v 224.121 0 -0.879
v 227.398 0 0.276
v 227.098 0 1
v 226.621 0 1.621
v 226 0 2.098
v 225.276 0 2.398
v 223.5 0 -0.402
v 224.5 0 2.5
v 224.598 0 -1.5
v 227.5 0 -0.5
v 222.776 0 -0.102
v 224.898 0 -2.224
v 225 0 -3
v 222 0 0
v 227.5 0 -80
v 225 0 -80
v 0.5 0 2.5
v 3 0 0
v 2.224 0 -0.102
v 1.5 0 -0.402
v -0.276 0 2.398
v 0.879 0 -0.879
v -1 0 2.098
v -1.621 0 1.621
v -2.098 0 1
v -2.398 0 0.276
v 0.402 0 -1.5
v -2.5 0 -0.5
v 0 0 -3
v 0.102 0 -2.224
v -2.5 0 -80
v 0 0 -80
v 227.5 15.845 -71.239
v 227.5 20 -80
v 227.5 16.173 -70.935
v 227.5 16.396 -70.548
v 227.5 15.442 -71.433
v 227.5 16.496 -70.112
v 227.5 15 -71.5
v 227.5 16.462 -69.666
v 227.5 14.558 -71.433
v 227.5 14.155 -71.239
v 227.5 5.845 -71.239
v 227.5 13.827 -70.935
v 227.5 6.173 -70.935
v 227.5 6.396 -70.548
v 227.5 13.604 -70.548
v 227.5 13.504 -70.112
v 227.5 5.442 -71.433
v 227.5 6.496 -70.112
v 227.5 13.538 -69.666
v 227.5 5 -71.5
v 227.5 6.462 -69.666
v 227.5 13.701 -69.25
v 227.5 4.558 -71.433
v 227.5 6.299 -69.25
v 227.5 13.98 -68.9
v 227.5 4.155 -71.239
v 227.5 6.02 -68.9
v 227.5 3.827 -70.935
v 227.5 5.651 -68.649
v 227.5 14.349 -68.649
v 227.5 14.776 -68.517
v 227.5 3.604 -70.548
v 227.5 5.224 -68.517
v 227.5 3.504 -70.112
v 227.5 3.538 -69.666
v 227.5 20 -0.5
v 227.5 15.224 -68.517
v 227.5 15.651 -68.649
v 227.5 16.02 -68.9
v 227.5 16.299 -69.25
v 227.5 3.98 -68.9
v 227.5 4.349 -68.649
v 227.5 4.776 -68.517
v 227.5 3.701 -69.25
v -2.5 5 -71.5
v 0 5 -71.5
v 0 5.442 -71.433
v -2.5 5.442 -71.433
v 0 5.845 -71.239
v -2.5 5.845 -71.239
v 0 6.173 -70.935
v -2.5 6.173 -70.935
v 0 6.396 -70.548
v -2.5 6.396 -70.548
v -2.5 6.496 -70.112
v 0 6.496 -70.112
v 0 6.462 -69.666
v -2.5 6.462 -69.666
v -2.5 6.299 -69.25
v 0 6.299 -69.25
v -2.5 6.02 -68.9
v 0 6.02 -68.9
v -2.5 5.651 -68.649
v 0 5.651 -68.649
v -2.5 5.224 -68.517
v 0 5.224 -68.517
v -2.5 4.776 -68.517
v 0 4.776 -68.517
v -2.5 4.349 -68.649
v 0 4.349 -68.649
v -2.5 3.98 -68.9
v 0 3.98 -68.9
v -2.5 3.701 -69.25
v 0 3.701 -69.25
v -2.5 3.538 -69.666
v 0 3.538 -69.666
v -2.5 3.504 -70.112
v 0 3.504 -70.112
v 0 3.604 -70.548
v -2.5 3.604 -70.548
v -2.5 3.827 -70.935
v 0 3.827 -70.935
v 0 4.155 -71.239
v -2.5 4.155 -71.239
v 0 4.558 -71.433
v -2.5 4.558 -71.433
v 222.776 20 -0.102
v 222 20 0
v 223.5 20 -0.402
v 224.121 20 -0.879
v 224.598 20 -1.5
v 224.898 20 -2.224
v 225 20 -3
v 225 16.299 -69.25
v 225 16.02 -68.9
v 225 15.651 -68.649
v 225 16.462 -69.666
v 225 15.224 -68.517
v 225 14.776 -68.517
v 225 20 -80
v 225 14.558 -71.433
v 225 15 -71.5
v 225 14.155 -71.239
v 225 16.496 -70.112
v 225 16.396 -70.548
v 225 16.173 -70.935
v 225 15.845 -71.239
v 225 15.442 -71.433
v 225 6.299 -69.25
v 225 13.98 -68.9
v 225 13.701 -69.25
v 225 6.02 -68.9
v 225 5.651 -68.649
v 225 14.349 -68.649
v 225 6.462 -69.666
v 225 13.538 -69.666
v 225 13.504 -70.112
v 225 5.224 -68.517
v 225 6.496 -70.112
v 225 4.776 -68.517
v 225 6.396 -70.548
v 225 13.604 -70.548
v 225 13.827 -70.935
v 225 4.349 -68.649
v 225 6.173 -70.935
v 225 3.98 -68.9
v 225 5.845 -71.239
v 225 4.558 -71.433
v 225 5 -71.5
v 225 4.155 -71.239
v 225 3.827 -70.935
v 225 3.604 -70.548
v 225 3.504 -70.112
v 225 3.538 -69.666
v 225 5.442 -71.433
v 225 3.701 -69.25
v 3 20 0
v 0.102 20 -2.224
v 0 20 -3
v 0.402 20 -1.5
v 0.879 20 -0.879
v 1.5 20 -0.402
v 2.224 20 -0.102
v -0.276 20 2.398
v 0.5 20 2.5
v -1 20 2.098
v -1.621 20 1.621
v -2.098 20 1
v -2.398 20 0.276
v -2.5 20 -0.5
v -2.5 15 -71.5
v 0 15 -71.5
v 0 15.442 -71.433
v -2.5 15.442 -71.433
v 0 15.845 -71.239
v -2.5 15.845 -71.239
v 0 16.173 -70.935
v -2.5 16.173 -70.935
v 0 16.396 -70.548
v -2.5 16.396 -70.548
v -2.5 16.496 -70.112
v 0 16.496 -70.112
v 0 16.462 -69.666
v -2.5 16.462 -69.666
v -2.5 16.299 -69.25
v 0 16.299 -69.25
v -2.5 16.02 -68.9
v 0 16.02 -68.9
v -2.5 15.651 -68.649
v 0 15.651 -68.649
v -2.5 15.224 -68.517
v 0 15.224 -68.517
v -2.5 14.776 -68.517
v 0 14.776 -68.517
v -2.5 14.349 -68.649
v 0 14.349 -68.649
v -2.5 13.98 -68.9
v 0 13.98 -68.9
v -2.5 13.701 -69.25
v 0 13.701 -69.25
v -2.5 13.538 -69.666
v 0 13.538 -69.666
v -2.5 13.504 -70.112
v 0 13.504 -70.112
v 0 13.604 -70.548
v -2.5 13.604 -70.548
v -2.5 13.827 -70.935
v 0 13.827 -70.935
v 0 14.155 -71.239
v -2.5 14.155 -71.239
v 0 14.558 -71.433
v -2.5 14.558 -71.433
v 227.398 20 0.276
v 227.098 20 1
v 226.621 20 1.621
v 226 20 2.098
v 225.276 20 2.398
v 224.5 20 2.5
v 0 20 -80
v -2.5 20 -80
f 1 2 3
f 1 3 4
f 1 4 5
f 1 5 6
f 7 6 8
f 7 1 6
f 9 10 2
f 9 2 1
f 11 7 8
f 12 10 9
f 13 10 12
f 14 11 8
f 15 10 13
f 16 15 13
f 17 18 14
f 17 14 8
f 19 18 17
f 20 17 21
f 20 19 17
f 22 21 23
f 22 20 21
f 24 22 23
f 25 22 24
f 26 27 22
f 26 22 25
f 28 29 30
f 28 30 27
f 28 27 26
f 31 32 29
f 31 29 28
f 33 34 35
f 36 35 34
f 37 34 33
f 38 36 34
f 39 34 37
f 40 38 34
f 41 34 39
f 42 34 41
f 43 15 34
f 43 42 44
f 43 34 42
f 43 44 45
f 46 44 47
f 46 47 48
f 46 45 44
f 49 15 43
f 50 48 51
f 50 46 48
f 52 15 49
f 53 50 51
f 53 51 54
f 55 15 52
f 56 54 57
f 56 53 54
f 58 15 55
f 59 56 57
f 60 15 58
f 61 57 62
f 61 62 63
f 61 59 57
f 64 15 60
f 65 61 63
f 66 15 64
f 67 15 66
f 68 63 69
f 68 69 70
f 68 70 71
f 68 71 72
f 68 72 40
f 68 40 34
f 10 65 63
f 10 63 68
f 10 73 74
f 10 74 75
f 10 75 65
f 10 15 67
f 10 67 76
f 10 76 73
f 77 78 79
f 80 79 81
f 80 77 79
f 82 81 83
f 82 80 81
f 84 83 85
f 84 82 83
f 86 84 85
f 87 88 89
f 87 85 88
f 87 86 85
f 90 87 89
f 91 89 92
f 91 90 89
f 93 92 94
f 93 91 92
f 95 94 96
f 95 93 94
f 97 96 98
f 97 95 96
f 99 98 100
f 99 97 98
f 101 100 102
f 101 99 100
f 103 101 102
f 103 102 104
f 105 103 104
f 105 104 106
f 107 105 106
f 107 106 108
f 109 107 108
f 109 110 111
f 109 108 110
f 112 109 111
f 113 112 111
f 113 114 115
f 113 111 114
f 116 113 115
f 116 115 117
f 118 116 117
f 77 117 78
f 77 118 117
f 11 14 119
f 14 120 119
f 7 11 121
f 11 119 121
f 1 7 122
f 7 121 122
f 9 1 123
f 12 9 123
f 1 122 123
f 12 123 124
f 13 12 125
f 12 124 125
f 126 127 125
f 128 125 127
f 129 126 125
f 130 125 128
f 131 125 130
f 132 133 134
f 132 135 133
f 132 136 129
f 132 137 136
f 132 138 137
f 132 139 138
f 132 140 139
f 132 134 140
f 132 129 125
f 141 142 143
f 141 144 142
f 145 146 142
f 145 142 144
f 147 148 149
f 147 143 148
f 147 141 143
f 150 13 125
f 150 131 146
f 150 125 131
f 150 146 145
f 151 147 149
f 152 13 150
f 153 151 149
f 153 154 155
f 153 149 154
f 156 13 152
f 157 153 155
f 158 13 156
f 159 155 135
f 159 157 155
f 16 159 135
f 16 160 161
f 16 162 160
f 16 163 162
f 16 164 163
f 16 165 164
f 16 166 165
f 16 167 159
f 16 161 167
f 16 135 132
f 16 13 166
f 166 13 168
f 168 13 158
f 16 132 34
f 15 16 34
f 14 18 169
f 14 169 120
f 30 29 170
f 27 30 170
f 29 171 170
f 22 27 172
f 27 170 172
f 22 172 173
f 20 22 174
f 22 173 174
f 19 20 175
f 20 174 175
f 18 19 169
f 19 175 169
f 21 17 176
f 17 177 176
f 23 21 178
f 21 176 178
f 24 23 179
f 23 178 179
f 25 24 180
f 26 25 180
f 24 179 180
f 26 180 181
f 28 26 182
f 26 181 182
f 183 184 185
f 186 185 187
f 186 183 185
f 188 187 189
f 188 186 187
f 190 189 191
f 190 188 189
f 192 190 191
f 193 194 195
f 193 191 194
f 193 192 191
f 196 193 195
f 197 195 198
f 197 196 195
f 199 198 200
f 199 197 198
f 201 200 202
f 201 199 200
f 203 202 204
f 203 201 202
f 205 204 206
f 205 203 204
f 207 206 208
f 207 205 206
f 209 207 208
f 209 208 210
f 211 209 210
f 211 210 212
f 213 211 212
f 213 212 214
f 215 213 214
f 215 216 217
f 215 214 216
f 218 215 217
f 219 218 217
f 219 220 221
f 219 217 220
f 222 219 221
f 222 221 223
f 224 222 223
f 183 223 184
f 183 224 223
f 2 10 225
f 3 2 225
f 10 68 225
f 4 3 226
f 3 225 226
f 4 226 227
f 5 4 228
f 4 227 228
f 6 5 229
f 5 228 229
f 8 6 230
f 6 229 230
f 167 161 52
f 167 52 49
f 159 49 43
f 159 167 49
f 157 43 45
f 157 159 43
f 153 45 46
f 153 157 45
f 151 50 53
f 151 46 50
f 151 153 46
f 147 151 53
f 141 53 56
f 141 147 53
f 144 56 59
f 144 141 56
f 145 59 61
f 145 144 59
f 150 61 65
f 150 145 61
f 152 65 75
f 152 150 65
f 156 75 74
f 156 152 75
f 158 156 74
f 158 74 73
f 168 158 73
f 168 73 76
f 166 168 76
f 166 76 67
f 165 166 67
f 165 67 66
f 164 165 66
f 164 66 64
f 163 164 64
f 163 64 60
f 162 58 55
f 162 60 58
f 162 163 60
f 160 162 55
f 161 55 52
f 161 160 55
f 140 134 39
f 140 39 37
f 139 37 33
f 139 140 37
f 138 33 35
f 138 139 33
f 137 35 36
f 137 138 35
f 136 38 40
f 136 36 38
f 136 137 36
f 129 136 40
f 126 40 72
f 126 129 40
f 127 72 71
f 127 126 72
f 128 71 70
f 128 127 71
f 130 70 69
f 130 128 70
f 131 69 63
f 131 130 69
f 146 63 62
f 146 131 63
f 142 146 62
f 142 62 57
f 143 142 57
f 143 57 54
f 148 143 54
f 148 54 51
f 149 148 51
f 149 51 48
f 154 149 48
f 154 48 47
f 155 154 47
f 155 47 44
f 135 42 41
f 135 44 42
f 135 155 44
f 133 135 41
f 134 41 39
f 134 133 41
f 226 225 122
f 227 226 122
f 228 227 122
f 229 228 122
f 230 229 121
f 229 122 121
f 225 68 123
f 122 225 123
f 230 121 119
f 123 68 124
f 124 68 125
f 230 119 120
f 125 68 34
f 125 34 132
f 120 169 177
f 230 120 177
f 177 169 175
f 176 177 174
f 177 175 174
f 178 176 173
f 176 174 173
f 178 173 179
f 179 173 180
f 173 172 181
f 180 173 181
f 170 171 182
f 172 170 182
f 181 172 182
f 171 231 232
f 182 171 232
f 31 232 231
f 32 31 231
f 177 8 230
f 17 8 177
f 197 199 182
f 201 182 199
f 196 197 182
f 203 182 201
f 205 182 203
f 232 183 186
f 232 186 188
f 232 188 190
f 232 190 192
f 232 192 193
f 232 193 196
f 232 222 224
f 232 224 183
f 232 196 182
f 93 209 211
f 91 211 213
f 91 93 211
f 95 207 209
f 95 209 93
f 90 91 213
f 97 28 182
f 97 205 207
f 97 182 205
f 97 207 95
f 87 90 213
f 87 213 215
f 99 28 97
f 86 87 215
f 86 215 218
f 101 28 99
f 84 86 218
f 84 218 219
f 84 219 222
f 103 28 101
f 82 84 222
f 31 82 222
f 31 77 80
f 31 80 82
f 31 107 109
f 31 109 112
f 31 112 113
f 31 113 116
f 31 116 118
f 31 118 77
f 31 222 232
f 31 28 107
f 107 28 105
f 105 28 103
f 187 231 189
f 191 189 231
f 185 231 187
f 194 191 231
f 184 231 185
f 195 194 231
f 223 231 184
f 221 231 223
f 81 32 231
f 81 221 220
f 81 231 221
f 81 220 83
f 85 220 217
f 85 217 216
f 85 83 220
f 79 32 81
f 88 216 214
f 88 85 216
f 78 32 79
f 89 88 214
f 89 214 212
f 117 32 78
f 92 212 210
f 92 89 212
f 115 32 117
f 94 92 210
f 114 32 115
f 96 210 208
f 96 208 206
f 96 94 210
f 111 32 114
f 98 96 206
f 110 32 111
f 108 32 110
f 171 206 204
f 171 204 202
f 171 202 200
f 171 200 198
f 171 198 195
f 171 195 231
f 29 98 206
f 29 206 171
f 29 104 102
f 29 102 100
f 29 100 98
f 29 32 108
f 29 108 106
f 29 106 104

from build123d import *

# Parameters (mm, degrees)
EXTRUDE_THIN1_DEPTH = 20
FILLET1_R           = 3
SKETCH2_R           = 1.5
CUT_EXTRUDE1_DEPTH  = 270


with BuildPart() as part:
    # Sketch1 → Extrude-Thin1 (new body)
    with BuildSketch(Plane(origin=(0, 0, 0), x_dir=(1, 0, 0), z_dir=(0, 1, 0))):
        Polygon((0, 80), (0, 0), (225, 0), (225, 80), (227.5, 80), (227.5, -2.5), (-2.5, -2.5), (-2.5, 80), align=None)
    extrude(amount=EXTRUDE_THIN1_DEPTH)

    # Fillet1
    fillet1_edges = [part.edges().sort_by_distance(p)[0] for p in [
        (227.5, 10, 2.5),
        (-2.5, 10, 2.5),
        (0, 10, 0),
        (225, 10, 0),
    ]]
    fillet(fillet1_edges, radius=FILLET1_R)

    # Sketch2 → Cut-Extrude1 (cut)
    with BuildSketch(Plane(origin=(-2.5, 0, 0), x_dir=(0, 0, -1), z_dir=(1, 0, 0))):
        with Locations((70, 15)):
            Circle(SKETCH2_R)
        with Locations((70, 5)):
            Circle(SKETCH2_R)
    extrude(amount=CUT_EXTRUDE1_DEPTH, mode=Mode.SUBTRACT)


solid = part.part
